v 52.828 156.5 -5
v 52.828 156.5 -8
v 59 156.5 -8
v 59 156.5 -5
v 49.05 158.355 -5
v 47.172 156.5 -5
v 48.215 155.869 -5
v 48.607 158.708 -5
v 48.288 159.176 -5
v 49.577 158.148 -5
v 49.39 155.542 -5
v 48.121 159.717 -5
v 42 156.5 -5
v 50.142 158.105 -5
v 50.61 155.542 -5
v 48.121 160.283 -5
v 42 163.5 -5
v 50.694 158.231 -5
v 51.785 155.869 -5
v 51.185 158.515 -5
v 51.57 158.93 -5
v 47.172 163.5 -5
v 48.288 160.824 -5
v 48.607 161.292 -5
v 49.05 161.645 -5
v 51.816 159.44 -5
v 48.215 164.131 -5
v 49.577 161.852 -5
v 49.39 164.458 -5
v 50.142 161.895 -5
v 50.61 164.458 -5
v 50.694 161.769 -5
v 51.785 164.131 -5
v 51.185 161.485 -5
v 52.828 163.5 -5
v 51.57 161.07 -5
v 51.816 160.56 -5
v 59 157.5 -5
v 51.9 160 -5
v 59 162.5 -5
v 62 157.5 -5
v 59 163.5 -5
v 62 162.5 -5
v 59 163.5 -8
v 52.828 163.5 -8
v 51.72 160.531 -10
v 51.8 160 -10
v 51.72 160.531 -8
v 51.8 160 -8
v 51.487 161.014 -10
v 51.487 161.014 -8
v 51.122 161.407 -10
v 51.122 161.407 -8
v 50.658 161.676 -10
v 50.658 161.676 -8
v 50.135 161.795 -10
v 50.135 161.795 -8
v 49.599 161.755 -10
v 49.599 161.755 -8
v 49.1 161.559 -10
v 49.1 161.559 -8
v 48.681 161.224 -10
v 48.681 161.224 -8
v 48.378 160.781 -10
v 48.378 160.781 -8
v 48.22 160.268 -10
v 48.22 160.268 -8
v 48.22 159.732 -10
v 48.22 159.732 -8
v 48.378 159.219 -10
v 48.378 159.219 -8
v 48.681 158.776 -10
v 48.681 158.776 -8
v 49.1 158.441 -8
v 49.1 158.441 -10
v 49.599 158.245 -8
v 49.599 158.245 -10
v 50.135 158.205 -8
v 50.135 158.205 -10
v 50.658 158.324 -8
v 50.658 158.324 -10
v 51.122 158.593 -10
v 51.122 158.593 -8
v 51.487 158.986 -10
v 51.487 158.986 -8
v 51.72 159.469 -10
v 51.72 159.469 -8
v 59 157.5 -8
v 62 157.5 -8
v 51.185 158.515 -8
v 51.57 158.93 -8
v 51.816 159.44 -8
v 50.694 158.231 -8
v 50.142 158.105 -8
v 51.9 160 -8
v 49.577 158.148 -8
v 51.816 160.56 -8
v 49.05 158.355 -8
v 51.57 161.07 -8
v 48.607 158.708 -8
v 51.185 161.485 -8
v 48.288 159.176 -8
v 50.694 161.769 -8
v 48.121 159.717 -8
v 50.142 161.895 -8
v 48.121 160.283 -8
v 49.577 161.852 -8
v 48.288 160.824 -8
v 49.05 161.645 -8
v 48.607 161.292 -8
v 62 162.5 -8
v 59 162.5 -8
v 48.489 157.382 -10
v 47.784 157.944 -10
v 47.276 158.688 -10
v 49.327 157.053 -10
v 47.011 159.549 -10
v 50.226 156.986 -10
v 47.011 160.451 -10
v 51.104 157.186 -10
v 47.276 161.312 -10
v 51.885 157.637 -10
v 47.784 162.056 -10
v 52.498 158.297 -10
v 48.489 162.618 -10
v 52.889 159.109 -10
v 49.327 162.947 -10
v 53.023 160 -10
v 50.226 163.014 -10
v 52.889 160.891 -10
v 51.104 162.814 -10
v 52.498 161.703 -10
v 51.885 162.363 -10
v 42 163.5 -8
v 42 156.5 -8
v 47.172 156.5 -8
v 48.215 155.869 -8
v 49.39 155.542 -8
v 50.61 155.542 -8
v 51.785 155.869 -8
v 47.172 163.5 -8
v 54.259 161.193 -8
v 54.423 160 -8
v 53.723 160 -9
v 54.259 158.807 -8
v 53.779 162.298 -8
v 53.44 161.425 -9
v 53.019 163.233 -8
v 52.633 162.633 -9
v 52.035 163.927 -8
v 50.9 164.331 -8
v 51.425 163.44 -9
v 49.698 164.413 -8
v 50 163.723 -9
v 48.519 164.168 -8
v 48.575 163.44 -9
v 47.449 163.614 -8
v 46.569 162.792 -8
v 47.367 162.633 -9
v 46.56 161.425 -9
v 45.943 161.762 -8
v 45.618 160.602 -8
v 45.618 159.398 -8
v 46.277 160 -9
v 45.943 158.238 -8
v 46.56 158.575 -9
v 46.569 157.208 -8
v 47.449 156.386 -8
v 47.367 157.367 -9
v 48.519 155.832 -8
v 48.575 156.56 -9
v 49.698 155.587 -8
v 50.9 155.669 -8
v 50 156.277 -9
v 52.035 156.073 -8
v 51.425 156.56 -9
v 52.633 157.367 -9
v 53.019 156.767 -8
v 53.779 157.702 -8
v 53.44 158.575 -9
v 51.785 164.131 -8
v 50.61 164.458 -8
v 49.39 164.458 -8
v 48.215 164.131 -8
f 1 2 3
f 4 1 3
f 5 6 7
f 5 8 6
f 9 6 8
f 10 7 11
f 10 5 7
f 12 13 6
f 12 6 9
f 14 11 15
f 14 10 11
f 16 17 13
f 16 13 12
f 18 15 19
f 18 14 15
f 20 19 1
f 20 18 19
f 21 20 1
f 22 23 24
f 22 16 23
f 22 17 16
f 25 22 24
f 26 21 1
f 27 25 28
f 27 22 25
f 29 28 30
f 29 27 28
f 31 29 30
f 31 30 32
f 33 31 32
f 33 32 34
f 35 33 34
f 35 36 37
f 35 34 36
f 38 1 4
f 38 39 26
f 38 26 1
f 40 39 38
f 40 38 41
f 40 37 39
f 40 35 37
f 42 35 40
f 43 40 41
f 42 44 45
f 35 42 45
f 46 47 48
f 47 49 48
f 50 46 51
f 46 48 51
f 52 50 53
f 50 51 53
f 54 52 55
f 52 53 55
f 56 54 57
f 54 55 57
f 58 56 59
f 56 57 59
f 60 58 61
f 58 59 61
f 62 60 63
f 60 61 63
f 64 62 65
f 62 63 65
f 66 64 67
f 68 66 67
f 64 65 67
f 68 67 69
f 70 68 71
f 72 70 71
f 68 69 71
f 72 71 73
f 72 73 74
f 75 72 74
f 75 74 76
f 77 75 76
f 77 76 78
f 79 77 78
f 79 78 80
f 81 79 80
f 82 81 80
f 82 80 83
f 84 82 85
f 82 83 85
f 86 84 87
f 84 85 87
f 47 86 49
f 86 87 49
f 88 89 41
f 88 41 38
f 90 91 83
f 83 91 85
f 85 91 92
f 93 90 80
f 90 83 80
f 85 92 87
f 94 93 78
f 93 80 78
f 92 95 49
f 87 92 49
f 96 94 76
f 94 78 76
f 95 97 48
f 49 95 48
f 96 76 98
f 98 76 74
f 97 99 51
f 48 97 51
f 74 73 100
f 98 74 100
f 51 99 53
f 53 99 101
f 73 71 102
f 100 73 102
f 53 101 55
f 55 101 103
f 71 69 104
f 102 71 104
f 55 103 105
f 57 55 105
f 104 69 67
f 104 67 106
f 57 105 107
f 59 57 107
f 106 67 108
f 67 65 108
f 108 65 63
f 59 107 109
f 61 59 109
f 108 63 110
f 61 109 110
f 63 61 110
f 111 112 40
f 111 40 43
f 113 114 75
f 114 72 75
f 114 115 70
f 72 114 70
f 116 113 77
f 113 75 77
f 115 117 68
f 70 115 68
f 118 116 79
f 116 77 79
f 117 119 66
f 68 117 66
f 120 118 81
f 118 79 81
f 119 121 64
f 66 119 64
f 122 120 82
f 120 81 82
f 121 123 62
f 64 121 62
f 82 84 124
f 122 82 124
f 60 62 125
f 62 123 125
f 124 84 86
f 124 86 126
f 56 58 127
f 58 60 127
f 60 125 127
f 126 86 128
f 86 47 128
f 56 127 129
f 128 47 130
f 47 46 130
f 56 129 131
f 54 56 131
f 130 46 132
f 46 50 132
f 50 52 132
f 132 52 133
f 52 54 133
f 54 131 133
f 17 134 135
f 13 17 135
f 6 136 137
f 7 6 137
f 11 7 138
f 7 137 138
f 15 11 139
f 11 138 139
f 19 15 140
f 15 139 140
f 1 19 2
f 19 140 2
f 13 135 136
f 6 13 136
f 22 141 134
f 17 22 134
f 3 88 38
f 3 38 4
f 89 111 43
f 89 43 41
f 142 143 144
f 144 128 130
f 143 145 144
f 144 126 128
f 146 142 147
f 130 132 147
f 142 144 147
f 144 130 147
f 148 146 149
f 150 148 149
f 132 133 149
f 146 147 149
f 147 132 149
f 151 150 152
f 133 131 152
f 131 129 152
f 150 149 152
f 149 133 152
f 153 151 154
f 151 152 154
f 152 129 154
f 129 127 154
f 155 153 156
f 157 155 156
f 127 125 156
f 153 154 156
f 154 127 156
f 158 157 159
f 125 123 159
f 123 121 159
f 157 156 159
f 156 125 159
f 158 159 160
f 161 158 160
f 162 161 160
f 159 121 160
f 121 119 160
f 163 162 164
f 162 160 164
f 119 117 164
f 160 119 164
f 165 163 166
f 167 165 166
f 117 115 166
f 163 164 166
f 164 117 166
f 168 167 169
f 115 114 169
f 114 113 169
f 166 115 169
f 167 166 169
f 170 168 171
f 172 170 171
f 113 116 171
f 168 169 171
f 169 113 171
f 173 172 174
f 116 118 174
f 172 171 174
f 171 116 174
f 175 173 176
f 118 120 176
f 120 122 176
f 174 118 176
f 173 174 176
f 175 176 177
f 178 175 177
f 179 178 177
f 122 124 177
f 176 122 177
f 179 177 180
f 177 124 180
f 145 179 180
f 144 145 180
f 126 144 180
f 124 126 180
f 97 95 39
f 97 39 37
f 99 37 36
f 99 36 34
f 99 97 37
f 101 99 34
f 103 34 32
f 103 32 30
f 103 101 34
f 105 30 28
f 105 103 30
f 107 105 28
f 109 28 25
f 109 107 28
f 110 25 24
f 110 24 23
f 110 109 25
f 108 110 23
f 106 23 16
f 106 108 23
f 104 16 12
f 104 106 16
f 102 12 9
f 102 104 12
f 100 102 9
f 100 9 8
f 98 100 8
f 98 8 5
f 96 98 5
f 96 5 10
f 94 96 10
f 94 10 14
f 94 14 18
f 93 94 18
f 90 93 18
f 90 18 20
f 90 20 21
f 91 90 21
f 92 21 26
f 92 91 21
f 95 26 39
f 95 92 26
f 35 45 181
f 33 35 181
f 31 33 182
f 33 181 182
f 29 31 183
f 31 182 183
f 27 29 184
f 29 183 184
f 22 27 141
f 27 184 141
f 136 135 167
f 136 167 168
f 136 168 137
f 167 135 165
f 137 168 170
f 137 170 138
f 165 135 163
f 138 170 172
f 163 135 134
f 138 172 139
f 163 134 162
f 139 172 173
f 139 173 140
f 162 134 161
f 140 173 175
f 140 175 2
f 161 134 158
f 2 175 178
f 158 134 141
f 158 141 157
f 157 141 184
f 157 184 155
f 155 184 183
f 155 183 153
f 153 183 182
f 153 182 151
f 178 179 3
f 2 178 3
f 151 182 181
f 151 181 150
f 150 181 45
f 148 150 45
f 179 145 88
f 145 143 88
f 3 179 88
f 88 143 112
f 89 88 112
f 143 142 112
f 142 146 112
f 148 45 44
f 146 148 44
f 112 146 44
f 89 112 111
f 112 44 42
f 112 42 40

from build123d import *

# Parameters (mm, degrees)
SKETCH146_R  = 1.9
PAD114_DEPTH = 3


with BuildPart() as innerbearingrace:
    # Sketch144 → Revolution005 (revolve)
    with BuildSketch(Plane(origin=(50, 160, -10), x_dir=(1, 0, 0), z_dir=(0, -1, 0))):
        Polygon((4.423355, 2), (3.02294, 0), (1.8, 0), (1.8, 2), align=None)
    revolve(axis=Axis((50, 160, -10), (0, 0, 1)))


with BuildPart() as steeringrod_long:
    # Sketch146 → Pad114 (new body)
    with BuildSketch(Plane(origin=(50, 160, -8), x_dir=(1, 0, 0), z_dir=(0, 0, 1))):
        with BuildLine():
            Line((9, 3.5), (2.828427, 3.5))
            ThreePointArc((2.828427, 3.5), (0, 4.5), (-2.828427, 3.5))
            Line((-2.828427, 3.5), (-8, 3.5))
            Line((-8, 3.5), (-8, -3.5))
            Line((-8, -3.5), (-2.828427, -3.5))
            ThreePointArc((-2.828427, -3.5), (0, -4.5), (2.828427, -3.5))
            Line((2.828427, -3.5), (9, -3.5))
            Line((9, -2.5), (9, -3.5))
            Line((12, -2.5), (9, -2.5))
            Line((12, 2.5), (12, -2.5))
            Line((9, 2.5), (12, 2.5))
            Line((9, 3.5), (9, 2.5))
        make_face()
        Circle(SKETCH146_R, mode=Mode.SUBTRACT)
    extrude(amount=PAD114_DEPTH)

    # Fusion004020022: union InnerBearingRace
    add(innerbearingrace.part)


solid = steeringrod_long.part
